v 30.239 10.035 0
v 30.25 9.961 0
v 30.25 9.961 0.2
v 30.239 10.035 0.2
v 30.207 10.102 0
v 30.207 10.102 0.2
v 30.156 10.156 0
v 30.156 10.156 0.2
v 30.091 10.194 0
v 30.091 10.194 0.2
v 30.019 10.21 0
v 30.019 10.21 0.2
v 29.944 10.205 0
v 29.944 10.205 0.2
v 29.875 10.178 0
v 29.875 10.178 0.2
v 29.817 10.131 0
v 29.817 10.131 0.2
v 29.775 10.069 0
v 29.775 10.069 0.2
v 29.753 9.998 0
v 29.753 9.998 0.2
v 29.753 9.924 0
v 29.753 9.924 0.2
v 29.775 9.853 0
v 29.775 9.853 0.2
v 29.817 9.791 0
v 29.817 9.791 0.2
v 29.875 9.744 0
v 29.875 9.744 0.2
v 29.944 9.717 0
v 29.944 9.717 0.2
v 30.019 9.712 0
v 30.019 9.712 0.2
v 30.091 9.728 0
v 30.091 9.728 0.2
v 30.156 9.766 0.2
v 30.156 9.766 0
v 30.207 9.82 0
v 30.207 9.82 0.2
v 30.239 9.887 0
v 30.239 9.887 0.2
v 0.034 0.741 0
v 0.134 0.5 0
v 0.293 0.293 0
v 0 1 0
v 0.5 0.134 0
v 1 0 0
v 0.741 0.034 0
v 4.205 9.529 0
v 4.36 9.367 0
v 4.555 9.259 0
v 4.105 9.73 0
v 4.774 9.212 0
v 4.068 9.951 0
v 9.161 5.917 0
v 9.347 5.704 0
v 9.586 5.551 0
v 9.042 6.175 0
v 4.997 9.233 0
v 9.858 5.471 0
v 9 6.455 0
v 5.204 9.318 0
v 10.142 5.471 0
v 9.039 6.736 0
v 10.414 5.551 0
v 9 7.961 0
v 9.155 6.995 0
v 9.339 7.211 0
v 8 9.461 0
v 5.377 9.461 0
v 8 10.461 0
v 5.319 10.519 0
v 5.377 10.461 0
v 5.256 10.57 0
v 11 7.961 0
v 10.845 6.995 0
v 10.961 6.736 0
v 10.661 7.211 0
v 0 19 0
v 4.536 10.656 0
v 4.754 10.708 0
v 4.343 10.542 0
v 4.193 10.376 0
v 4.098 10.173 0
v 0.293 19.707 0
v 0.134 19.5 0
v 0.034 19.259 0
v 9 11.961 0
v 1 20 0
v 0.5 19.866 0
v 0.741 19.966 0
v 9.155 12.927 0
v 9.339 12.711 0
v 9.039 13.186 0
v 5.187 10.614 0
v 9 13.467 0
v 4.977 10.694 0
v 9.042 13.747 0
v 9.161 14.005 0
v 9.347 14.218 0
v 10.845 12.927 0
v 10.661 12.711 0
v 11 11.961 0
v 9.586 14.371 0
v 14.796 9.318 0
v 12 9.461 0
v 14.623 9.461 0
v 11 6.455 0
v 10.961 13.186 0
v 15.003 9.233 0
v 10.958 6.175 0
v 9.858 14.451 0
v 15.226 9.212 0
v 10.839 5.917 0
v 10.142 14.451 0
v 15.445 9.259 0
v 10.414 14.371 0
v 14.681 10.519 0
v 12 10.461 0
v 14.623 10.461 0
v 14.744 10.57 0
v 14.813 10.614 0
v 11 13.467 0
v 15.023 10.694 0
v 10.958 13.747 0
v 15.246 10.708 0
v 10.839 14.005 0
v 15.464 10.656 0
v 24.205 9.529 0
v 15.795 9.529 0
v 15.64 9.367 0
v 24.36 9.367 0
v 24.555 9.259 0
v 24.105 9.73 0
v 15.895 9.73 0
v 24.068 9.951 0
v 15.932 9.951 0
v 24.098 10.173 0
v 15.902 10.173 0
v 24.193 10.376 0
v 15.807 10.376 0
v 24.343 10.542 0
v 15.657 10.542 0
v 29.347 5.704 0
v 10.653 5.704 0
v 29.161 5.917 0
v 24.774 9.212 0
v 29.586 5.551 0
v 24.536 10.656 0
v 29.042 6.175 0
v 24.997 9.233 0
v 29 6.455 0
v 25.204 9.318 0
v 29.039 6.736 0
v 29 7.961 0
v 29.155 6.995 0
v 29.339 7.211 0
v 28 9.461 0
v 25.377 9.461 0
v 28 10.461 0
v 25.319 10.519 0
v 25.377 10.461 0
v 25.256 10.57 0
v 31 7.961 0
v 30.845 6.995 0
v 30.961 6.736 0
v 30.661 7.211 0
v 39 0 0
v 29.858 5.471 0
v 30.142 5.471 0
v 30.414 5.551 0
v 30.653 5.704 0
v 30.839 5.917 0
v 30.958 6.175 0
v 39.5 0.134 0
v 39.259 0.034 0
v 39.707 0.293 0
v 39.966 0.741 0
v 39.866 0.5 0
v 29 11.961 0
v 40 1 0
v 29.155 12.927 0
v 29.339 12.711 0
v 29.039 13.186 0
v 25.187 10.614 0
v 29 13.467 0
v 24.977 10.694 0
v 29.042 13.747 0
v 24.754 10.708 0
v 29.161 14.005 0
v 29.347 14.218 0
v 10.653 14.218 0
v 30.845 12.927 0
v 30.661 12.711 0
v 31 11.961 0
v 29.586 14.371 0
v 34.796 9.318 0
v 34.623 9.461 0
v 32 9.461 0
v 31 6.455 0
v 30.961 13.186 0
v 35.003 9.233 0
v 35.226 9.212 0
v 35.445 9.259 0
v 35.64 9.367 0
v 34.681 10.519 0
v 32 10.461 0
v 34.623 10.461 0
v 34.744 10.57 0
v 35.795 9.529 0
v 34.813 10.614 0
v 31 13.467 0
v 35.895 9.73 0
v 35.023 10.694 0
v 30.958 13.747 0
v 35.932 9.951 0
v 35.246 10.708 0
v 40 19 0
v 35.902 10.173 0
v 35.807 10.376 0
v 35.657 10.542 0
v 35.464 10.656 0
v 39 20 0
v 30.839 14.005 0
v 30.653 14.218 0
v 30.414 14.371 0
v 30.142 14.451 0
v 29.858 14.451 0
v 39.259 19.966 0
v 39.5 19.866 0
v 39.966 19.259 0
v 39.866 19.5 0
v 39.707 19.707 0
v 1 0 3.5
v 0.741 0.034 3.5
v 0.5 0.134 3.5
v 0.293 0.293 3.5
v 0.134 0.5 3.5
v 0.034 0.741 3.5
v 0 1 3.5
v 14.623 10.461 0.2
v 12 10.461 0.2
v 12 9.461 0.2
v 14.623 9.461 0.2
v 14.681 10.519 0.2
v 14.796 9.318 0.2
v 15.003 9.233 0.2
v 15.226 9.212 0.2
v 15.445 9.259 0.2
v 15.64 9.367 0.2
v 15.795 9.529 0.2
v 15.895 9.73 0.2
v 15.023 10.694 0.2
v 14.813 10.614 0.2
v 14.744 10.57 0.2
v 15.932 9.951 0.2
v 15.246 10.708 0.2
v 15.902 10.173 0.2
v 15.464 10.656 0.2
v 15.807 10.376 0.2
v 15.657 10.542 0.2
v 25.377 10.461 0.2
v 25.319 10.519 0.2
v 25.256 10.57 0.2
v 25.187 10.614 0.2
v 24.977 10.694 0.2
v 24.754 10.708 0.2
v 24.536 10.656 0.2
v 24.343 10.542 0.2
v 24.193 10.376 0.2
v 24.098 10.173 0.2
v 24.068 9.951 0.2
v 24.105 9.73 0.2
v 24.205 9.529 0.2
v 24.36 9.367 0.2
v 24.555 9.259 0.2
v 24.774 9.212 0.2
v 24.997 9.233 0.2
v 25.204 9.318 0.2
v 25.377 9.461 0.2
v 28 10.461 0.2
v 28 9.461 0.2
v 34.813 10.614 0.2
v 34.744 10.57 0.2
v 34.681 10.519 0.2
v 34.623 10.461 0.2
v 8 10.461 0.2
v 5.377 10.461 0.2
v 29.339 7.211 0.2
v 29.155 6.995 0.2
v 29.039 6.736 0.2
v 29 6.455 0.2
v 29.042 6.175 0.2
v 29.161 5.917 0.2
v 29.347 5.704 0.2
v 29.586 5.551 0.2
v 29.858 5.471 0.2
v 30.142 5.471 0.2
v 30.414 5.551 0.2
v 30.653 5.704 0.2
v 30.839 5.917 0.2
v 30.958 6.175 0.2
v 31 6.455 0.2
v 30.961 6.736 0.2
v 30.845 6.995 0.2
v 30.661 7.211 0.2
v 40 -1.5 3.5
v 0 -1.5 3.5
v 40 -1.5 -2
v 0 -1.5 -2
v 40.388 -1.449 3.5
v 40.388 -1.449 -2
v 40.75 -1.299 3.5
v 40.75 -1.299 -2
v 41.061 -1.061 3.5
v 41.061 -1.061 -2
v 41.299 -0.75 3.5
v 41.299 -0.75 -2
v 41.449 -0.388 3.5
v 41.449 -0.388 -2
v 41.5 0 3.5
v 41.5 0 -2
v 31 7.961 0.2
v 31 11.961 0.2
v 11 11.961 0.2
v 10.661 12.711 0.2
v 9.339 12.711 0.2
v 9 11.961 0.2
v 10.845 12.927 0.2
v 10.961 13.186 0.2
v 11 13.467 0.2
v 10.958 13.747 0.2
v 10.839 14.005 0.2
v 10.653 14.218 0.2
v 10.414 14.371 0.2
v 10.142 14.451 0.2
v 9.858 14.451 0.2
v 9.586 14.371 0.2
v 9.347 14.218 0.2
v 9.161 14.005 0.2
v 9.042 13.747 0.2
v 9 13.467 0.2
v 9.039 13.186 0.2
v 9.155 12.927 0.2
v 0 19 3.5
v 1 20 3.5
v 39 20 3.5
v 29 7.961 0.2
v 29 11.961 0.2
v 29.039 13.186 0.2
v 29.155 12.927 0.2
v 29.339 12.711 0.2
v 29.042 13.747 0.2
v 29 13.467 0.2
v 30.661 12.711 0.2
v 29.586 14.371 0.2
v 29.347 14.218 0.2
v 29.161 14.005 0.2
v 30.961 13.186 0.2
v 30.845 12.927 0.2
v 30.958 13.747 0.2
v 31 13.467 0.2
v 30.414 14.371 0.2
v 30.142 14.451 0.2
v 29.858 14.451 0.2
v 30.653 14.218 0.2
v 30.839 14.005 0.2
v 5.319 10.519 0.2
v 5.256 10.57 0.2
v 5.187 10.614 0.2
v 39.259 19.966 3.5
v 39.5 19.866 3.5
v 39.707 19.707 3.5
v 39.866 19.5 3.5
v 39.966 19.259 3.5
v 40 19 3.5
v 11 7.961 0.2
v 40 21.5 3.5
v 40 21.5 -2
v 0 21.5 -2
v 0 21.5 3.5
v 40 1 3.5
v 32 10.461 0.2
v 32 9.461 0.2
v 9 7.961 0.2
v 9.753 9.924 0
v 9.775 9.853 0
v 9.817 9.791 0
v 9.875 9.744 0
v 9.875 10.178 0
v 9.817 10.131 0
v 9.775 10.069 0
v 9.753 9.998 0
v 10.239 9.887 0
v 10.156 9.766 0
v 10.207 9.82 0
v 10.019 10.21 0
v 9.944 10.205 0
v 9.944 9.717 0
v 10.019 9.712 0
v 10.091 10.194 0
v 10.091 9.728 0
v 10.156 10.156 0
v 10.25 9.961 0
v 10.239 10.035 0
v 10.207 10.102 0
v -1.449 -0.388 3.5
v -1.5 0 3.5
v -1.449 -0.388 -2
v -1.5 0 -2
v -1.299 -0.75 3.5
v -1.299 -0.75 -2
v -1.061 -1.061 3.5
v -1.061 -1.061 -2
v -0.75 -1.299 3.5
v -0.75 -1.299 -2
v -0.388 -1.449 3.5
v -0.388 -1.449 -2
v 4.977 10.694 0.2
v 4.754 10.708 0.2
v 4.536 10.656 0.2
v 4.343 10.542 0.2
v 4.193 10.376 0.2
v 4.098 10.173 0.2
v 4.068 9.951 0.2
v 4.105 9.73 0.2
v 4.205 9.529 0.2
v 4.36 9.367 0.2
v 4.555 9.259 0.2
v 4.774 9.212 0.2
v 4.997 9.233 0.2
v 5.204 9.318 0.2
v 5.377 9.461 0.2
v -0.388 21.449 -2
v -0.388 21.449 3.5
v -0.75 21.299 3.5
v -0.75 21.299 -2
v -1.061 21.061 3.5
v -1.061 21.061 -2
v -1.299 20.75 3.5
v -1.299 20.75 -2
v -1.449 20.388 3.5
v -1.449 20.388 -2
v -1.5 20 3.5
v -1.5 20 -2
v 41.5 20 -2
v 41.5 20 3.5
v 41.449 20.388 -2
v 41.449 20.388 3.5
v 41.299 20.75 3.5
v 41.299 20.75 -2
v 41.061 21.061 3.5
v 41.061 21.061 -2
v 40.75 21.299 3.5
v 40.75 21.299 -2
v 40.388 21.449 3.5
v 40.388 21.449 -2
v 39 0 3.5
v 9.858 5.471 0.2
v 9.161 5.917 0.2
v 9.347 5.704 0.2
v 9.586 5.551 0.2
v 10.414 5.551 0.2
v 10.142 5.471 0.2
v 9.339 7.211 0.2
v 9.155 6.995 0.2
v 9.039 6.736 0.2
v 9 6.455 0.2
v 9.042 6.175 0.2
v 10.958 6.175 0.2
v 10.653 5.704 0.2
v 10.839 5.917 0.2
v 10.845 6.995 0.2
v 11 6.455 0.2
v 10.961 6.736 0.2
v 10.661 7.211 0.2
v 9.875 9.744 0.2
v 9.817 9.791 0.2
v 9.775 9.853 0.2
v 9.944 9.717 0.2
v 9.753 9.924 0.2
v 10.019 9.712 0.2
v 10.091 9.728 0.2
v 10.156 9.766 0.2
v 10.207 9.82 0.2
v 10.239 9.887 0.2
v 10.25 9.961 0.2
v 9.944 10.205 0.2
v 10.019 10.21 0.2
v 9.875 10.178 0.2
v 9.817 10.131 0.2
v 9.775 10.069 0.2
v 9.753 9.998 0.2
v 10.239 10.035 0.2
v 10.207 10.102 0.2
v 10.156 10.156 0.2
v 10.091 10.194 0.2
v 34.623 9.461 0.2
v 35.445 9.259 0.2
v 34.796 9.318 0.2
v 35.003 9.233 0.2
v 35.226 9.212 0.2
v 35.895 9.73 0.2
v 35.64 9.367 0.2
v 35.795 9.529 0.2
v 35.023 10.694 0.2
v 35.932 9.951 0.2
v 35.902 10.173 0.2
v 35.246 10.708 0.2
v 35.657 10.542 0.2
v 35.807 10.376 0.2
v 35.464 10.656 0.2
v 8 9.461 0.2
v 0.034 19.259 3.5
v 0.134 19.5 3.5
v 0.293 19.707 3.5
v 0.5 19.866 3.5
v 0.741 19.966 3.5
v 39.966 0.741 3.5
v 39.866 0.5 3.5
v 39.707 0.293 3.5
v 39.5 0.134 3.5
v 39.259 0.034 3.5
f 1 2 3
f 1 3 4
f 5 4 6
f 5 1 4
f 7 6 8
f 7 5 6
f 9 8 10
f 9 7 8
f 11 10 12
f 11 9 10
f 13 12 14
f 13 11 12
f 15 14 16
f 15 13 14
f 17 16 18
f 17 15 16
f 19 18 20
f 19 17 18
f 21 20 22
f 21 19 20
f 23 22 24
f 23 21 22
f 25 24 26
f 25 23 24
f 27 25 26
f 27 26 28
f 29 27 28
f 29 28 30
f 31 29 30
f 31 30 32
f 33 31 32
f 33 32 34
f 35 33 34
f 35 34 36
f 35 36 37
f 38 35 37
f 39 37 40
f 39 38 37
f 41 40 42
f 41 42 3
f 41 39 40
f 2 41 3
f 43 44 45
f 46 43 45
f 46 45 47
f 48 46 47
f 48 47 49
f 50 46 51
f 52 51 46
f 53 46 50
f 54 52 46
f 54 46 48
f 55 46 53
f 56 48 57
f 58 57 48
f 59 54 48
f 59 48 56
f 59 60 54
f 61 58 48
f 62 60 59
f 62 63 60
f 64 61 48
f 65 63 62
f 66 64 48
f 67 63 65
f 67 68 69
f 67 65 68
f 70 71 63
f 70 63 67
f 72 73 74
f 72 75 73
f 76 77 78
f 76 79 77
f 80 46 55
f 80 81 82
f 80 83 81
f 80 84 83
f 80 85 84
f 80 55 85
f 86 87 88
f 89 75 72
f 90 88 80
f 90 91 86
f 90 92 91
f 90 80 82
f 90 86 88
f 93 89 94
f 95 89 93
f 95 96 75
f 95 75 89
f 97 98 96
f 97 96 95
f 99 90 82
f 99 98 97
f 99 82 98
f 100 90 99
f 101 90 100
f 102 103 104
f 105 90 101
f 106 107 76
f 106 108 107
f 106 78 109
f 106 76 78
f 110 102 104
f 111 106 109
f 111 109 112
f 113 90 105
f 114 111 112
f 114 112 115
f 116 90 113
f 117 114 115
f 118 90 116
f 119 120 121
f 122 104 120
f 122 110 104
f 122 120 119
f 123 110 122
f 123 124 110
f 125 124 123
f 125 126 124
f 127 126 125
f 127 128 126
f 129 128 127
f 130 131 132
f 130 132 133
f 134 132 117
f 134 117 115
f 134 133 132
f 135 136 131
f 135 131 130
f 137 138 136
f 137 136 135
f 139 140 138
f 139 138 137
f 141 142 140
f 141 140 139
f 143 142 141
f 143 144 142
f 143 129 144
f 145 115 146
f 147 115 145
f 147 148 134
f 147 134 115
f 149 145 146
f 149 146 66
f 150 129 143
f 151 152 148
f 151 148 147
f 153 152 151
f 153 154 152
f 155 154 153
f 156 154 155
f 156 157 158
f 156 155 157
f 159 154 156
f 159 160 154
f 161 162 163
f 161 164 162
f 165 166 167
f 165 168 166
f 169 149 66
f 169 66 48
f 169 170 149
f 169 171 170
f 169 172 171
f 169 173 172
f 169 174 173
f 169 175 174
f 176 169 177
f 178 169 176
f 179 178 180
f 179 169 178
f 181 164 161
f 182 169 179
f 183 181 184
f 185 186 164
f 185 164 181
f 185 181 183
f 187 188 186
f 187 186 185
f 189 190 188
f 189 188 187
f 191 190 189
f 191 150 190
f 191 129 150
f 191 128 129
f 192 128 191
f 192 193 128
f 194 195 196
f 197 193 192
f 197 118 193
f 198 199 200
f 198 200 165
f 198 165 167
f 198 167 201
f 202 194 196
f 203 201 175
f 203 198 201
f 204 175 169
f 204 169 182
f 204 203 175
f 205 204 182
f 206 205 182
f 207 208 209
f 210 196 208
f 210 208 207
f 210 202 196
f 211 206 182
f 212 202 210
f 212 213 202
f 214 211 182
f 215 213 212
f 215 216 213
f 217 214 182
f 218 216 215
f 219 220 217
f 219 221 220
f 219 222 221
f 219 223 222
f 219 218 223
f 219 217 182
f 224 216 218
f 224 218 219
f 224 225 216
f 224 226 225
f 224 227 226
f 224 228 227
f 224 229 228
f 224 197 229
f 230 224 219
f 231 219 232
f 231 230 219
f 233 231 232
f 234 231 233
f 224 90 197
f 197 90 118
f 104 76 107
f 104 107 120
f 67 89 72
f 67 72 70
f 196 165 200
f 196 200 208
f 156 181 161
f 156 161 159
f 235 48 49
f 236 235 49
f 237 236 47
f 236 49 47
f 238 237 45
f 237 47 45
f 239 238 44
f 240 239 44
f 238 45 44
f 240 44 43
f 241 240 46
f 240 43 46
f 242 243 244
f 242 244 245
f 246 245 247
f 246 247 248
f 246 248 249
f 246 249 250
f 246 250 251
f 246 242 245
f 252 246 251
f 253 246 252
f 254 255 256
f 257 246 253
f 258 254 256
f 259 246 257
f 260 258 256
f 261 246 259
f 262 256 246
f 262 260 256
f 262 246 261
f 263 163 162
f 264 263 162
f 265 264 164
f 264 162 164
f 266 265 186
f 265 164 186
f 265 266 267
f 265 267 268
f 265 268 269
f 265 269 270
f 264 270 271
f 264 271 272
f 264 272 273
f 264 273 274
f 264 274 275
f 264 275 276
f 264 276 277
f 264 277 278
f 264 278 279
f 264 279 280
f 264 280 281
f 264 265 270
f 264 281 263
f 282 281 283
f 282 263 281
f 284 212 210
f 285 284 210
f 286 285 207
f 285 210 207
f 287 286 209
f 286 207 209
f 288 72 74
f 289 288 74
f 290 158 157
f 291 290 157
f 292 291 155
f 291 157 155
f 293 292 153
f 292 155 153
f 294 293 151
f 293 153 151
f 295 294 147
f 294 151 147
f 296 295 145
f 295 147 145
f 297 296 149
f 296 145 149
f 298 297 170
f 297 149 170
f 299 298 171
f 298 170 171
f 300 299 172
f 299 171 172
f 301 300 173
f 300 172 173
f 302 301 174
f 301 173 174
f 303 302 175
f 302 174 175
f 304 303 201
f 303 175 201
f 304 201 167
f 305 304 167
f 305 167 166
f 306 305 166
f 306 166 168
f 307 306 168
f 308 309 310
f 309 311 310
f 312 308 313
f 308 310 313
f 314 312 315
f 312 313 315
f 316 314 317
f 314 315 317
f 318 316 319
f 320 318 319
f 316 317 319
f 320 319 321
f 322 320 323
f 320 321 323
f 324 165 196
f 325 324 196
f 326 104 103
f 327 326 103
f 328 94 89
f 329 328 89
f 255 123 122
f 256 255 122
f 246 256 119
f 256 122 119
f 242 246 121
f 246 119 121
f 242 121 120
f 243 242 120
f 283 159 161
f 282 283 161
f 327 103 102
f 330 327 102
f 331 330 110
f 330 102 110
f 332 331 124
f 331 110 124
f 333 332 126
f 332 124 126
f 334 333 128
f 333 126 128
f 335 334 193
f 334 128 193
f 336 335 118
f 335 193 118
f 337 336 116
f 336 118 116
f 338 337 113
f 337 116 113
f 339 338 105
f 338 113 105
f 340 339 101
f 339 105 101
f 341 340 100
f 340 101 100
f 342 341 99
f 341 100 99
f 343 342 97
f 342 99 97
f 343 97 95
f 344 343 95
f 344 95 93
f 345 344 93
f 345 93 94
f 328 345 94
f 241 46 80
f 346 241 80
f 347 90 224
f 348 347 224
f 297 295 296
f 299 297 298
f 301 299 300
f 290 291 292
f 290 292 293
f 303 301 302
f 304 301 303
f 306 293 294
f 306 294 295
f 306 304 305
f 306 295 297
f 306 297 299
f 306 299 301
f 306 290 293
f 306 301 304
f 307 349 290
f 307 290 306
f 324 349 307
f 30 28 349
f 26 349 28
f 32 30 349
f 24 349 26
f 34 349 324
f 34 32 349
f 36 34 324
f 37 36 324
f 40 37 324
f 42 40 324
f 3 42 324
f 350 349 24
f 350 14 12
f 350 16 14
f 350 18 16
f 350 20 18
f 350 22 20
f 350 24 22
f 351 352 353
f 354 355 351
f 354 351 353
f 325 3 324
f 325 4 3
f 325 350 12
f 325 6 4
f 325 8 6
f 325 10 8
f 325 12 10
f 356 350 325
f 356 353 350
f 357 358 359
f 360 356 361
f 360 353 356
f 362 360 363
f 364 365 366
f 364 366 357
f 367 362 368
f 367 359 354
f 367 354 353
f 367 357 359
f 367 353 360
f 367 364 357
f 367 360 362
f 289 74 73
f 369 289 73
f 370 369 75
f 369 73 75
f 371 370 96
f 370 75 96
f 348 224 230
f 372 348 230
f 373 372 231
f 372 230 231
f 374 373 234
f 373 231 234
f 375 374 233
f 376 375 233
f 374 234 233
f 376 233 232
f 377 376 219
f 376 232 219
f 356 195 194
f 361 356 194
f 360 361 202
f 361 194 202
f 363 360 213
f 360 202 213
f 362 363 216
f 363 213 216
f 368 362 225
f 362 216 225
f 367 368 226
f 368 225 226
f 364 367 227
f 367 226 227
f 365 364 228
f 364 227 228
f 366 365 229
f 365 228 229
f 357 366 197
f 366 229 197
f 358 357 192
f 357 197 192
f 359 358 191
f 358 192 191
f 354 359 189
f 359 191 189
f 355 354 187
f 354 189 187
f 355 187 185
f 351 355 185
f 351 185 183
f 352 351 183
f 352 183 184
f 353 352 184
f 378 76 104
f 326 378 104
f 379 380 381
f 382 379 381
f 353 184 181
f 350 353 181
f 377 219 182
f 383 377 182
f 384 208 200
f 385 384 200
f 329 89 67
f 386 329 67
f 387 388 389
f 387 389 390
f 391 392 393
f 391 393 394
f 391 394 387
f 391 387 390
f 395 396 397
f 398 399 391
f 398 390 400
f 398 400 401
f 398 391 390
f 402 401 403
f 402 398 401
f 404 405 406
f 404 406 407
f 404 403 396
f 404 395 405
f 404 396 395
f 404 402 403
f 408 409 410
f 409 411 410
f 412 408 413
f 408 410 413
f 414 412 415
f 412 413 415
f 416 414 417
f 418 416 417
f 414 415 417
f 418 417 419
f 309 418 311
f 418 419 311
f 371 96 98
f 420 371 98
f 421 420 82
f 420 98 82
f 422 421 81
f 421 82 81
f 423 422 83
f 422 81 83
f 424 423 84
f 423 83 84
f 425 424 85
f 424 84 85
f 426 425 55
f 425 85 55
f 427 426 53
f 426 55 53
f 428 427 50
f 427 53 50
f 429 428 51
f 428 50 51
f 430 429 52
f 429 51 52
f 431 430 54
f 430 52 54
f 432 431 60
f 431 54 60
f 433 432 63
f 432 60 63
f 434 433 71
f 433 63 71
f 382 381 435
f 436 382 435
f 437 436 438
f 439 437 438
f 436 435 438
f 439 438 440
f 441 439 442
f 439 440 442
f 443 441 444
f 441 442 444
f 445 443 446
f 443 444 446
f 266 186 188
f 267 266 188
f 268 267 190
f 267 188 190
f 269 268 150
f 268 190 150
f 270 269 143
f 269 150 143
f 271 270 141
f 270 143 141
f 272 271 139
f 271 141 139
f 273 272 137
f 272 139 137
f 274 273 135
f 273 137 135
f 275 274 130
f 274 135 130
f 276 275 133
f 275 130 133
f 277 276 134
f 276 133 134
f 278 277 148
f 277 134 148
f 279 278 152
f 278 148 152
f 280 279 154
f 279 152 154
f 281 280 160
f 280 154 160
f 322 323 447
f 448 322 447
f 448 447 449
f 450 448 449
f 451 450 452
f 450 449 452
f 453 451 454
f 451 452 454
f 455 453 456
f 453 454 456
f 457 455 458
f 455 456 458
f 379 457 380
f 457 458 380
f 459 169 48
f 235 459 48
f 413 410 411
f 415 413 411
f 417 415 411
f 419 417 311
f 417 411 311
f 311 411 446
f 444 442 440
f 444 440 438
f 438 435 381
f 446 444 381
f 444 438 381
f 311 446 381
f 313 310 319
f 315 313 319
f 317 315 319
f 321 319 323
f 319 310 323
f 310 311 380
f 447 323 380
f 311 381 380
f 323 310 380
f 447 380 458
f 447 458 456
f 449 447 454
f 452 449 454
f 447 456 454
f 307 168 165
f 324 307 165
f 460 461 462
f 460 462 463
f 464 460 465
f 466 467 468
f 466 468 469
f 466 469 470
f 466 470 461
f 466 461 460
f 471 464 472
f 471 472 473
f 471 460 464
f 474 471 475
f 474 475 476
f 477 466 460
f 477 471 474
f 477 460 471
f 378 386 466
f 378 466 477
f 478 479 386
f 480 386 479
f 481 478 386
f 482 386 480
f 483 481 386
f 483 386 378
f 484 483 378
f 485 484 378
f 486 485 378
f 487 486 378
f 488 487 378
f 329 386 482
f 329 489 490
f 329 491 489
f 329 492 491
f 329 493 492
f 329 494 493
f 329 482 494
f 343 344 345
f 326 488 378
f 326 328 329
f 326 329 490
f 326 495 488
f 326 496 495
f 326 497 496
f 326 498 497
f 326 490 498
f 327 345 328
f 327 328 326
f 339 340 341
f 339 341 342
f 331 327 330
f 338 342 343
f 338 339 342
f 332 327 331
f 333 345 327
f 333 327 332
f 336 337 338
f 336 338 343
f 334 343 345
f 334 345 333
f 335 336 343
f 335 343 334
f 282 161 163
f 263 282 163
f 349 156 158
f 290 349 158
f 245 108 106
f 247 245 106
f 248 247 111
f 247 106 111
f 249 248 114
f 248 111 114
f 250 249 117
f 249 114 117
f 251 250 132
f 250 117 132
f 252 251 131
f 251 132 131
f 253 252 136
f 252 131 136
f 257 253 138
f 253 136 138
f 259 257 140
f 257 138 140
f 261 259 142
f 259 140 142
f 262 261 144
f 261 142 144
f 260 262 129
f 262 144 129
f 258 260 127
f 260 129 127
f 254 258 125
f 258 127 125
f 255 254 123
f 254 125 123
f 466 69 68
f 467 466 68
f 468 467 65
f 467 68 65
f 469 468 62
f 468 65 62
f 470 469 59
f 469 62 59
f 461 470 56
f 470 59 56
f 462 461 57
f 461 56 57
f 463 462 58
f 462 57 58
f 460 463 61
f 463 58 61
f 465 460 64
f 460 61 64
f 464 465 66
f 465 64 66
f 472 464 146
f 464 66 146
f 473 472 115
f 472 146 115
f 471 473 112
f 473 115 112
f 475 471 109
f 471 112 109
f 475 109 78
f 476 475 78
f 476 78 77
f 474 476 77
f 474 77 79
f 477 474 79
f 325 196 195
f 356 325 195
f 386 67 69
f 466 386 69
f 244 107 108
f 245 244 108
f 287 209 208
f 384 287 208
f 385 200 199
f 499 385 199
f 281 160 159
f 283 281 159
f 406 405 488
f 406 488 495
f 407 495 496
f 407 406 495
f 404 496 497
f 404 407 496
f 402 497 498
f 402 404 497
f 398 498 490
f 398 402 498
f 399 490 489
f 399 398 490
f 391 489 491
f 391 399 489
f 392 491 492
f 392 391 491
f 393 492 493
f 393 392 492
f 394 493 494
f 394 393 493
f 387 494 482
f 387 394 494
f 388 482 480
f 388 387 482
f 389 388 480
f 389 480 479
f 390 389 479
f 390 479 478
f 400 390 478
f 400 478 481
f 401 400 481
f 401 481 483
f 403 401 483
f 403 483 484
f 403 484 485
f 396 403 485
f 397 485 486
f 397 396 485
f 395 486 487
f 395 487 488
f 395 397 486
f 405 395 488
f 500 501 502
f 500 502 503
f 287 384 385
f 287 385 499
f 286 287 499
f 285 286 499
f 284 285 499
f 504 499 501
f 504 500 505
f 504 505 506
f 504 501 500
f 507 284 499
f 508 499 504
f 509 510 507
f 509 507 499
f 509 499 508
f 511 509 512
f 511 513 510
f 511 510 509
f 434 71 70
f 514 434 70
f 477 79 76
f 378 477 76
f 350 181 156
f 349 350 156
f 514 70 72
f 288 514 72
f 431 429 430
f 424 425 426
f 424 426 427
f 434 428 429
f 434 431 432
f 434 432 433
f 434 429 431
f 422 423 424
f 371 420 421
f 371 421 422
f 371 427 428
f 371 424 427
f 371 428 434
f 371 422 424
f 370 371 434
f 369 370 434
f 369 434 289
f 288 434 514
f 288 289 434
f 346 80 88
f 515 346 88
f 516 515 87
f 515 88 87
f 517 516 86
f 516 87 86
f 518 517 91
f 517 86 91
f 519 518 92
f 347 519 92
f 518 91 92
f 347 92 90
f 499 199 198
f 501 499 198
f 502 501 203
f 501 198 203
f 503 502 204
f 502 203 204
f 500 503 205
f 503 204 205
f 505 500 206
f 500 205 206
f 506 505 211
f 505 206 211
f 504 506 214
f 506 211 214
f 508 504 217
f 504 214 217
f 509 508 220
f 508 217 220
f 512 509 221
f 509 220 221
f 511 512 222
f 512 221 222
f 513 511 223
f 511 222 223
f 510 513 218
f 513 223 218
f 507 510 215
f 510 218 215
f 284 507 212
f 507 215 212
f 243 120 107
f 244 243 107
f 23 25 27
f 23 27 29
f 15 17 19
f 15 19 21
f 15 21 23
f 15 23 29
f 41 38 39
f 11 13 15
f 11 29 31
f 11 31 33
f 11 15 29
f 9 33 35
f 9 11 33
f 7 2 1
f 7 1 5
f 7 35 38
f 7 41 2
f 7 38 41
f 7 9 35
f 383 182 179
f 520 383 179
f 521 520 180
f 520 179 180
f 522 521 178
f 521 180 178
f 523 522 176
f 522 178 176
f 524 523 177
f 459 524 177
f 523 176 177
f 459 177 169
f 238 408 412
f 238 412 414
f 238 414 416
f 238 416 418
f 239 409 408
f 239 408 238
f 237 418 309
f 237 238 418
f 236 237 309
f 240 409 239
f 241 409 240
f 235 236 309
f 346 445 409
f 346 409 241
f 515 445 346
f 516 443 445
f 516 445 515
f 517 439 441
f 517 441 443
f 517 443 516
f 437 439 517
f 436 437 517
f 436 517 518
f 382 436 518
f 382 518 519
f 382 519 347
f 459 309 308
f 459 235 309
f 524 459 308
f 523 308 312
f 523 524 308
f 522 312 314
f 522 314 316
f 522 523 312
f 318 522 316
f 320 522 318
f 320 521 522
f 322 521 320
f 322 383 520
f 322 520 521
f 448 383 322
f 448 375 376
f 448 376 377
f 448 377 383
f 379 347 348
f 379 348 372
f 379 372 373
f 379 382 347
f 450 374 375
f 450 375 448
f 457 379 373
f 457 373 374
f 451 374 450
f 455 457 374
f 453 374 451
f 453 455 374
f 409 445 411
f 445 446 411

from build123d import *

# Parameters (mm, degrees)
F0_R     = 0.25
F1_DEPTH = 2
F2_DEPTH = 3.5
F3_DEPTH = 0.2


with BuildPart() as f1:
    # F0 (on Top) → F1 (new body)
    with BuildSketch(Plane.XY):
        with BuildLine():
            ThreePointArc((0, 21.5), (-1.06066, 21.06066), (-1.5, 20))
            Line((-1.5, 20), (-1.5, 0))
            ThreePointArc((-1.5, 0), (-1.06066, -1.06066), (0, -1.5))
            Line((0, -1.5), (40, -1.5))
            ThreePointArc((40, -1.5), (41.06066, -1.06066), (41.5, 0))
            Line((41.5, 0), (41.5, 20))
            ThreePointArc((41.5, 20), (41.06066, 21.06066), (40, 21.5))
            Line((40, 21.5), (0, 21.5))
        make_face()
        with BuildLine():
            Line((19.75, 0), (1, 0))
            ThreePointArc((1, 0), (0.292893, 0.292893), (0, 1))
            Line((0, 1), (0, 19))
            ThreePointArc((0, 19), (0.292893, 19.707107), (1, 20))
            Line((1, 20), (19.75, 20))
            Line((19.75, 20), (20.25, 20))
            Line((20.25, 20), (39, 20))
            ThreePointArc((39, 20), (39.707107, 19.707107), (40, 19))
            Line((40, 19), (40, 1))
            ThreePointArc((40, 1), (39.707107, 0.292893), (39, 0))
            Line((39, 0), (20.25, 0))
            Line((20.25, 0), (19.75, 0))
        make_face(mode=Mode.SUBTRACT)
        with BuildLine():
            ThreePointArc((0, 1), (0.292893, 0.292893), (1, 0))
            Line((1, 0), (19.75, 0))
            Line((19.75, 0), (19.75, 10))
            Line((19.75, 10), (19.75, 20))
            Line((19.75, 20), (1, 20))
            ThreePointArc((1, 20), (0.292893, 19.707107), (0, 19))
            Line((0, 19), (0, 1))
        make_face()
        with BuildLine():
            Line((10.661438, 12.711), (11, 11.961))
            Line((11, 11.961), (11.338563, 12.711))
            Line((11.338563, 12.711), (11.99852, 13.37373))
            Line((11.99852, 13.37373), (14.216055, 15.591268))
            ThreePointArc((14.216055, 15.591268), (15.889087, 16.557194), (14.923162, 14.884161))
            Line((14.923162, 14.884161), (12, 11.961))
            Line((12, 11.961), (12, 10.461))
            Line((12, 10.461), (14.622964, 10.461))
            ThreePointArc((14.622964, 10.461), (14.711865, 10.545372), (14.81332, 10.614138))
            ThreePointArc((14.81332, 10.614138), (15.921966, 9.838845), (14.622964, 9.461))
            Line((14.622964, 9.461), (12, 9.461))
            Line((12, 9.461), (12, 7.961))
            Line((12, 7.961), (14.923162, 5.037839))
            ThreePointArc((14.923162, 5.037839), (15.889087, 3.364806), (14.216055, 4.330732))
            Line((14.216055, 4.330732), (11.99852, 6.54827))
            Line((11.99852, 6.54827), (11.338563, 7.211))
            Line((11.338563, 7.211), (11, 7.961))
            Line((11, 7.961), (10.661438, 7.211))
            ThreePointArc((10.661438, 7.211), (10, 5.461), (9.338563, 7.211))
            Line((9.338563, 7.211), (9, 7.961))
            Line((9, 7.961), (8.661438, 7.211))
            Line((8.661438, 7.211), (8.001481, 6.54827))
            Line((8.001481, 6.54827), (5.783946, 4.330732))
            ThreePointArc((5.783946, 4.330732), (4.110914, 3.364806), (5.076839, 5.037839))
            Line((5.076839, 5.037839), (8, 7.961))
            Line((8, 7.961), (8, 9.461))
            Line((8, 9.461), (5.377037, 9.461))
            ThreePointArc((5.377037, 9.461), (4.078035, 9.838845), (5.18668, 10.614138))
            ThreePointArc((5.18668, 10.614138), (5.288136, 10.545372), (5.377037, 10.461))
            Line((5.377037, 10.461), (8, 10.461))
            Line((8, 10.461), (8, 11.961))
            Line((8, 11.961), (5.076839, 14.884161))
            ThreePointArc((5.076839, 14.884161), (4.110914, 16.557194), (5.783946, 15.591268))
            Line((5.783946, 15.591268), (8.001481, 13.37373))
            Line((8.001481, 13.37373), (8.661438, 12.711))
            Line((8.661438, 12.711), (9, 11.961))
            Line((9, 11.961), (9.338563, 12.711))
            ThreePointArc((9.338563, 12.711), (10, 14.461), (10.661438, 12.711))
        make_face(mode=Mode.SUBTRACT)
        with BuildLine():
            Line((11, 7.961), (11, 9.961))
            Line((11, 9.961), (11, 11.961))
            Line((11, 11.961), (10.661438, 12.711))
            ThreePointArc((10.661438, 12.711), (10, 14.461), (9.338563, 12.711))
            Line((9.338563, 12.711), (9, 11.961))
            Line((9, 11.961), (9, 9.961))
            Line((9, 9.961), (9, 7.961))
            Line((9, 7.961), (9.338563, 7.211))
            ThreePointArc((9.338563, 7.211), (10, 5.461), (10.661438, 7.211))
            Line((10.661438, 7.211), (11, 7.961))
        make_face()
        with Locations((10, 9.961)):
            Circle(F0_R, mode=Mode.SUBTRACT)
        with BuildLine():
            Line((9, 9.961), (9, 11.961))
            Line((9, 11.961), (8.661438, 12.711))
            Line((8.661438, 12.711), (8.001481, 13.37373))
            Line((8.001481, 13.37373), (5.783946, 15.591268))
            ThreePointArc((5.783946, 15.591268), (4.110914, 16.557194), (5.076839, 14.884161))
            Line((5.076839, 14.884161), (8, 11.961))
            Line((8, 11.961), (8, 10.461))
            Line((8, 10.461), (8, 9.961))
            Line((8, 9.961), (8, 9.461))
            Line((8, 9.461), (8, 7.961))
            Line((8, 7.961), (5.076839, 5.037839))
            ThreePointArc((5.076839, 5.037839), (4.110914, 3.364806), (5.783946, 4.330732))
            Line((5.783946, 4.330732), (8.001481, 6.54827))
            Line((8.001481, 6.54827), (8.661438, 7.211))
            Line((8.661438, 7.211), (9, 7.961))
            Line((9, 7.961), (9, 9.961))
        make_face()
        with BuildLine():
            Line((8, 9.961), (8, 10.461))
            Line((8, 10.461), (5.377037, 10.461))
            ThreePointArc((5.377037, 10.461), (5.288136, 10.545372), (5.18668, 10.614138))
            ThreePointArc((5.18668, 10.614138), (4.078035, 9.838845), (5.377037, 9.461))
            Line((5.377037, 9.461), (8, 9.461))
            Line((8, 9.461), (8, 9.961))
        make_face()
        with BuildLine():
            Line((11, 11.961), (11, 9.961))
            Line((11, 9.961), (11, 7.961))
            Line((11, 7.961), (11.338563, 7.211))
            Line((11.338563, 7.211), (11.99852, 6.54827))
            Line((11.99852, 6.54827), (14.216055, 4.330732))
            ThreePointArc((14.216055, 4.330732), (15.889087, 3.364806), (14.923162, 5.037839))
            Line((14.923162, 5.037839), (12, 7.961))
            Line((12, 7.961), (12, 9.461))
            Line((12, 9.461), (12, 9.961))
            Line((12, 9.961), (12, 10.461))
            Line((12, 10.461), (12, 11.961))
            Line((12, 11.961), (14.923162, 14.884161))
            ThreePointArc((14.923162, 14.884161), (15.889087, 16.557194), (14.216055, 15.591268))
            Line((14.216055, 15.591268), (11.99852, 13.37373))
            Line((11.99852, 13.37373), (11.338563, 12.711))
            Line((11.338563, 12.711), (11, 11.961))
        make_face()
        with BuildLine():
            Line((14.622964, 10.461), (12, 10.461))
            Line((12, 10.461), (12, 9.961))
            Line((12, 9.961), (12, 9.461))
            Line((12, 9.461), (14.622964, 9.461))
            ThreePointArc((14.622964, 9.461), (15.921966, 9.838845), (14.81332, 10.614138))
            ThreePointArc((14.81332, 10.614138), (14.711865, 10.545372), (14.622964, 10.461))
        make_face()
        Polygon((19.75, 10), (19.75, 0), (20.25, 0), (20.25, 20), (19.75, 20), align=None)
        with BuildLine():
            Line((20.25, 20), (20.25, 0))
            Line((20.25, 0), (39, 0))
            ThreePointArc((39, 0), (39.707107, 0.292893), (40, 1))
            Line((40, 1), (40, 19))
            ThreePointArc((40, 19), (39.707107, 19.707107), (39, 20))
            Line((39, 20), (20.25, 20))
        make_face()
        with BuildLine():
            Line((31, 11.961), (31.338562, 12.711))
            Line((31.338562, 12.711), (31.998519, 13.37373))
            Line((31.998519, 13.37373), (34.216054, 15.591268))
            ThreePointArc((34.216054, 15.591268), (35.889086, 16.557194), (34.923161, 14.884161))
            Line((34.923161, 14.884161), (32, 11.961))
            Line((32, 11.961), (32, 10.461))
            Line((32, 10.461), (34.622963, 10.461))
            ThreePointArc((34.622963, 10.461), (34.711864, 10.545372), (34.81332, 10.614138))
            ThreePointArc((34.81332, 10.614138), (35.921965, 9.838845), (34.622963, 9.461))
            Line((34.622963, 9.461), (32, 9.461))
            Line((32, 9.461), (32, 7.961))
            Line((32, 7.961), (34.923161, 5.037839))
            ThreePointArc((34.923161, 5.037839), (35.889086, 3.364806), (34.216054, 4.330732))
            Line((34.216054, 4.330732), (31.998519, 6.54827))
            Line((31.998519, 6.54827), (31.338562, 7.211))
            Line((31.338562, 7.211), (31, 7.961))
            Line((31, 7.961), (30.661437, 7.211))
            ThreePointArc((30.661437, 7.211), (30, 5.461), (29.338562, 7.211))
            Line((29.338562, 7.211), (29, 7.961))
            Line((29, 7.961), (28.661437, 7.211))
            Line((28.661437, 7.211), (28.00148, 6.54827))
            Line((28.00148, 6.54827), (25.783945, 4.330732))
            ThreePointArc((25.783945, 4.330732), (24.110913, 3.364806), (25.076838, 5.037839))
            Line((25.076838, 5.037839), (28, 7.961))
            Line((28, 7.961), (28, 9.461))
            Line((28, 9.461), (25.377036, 9.461))
            ThreePointArc((25.377036, 9.461), (24.078034, 9.838845), (25.18668, 10.614138))
            ThreePointArc((25.18668, 10.614138), (25.288135, 10.545372), (25.377036, 10.461))
            Line((25.377036, 10.461), (28, 10.461))
            Line((28, 10.461), (28, 11.961))
            Line((28, 11.961), (25.076838, 14.884161))
            ThreePointArc((25.076838, 14.884161), (24.110913, 16.557194), (25.783945, 15.591268))
            Line((25.783945, 15.591268), (28.00148, 13.37373))
            Line((28.00148, 13.37373), (28.661437, 12.711))
            Line((28.661437, 12.711), (29, 11.961))
            Line((29, 11.961), (29.338562, 12.711))
            ThreePointArc((29.338562, 12.711), (30, 14.461), (30.661437, 12.711))
            Line((30.661437, 12.711), (31, 11.961))
        make_face(mode=Mode.SUBTRACT)
        with BuildLine():
            Line((34.622963, 10.461), (32, 10.461))
            Line((32, 10.461), (32, 9.961))
            Line((32, 9.961), (32, 9.461))
            Line((32, 9.461), (34.622963, 9.461))
            ThreePointArc((34.622963, 9.461), (35.921965, 9.838845), (34.81332, 10.614138))
            ThreePointArc((34.81332, 10.614138), (34.711864, 10.545372), (34.622963, 10.461))
        make_face()
        with BuildLine():
            Line((31.998519, 13.37373), (31.338562, 12.711))
            Line((31.338562, 12.711), (31, 11.961))
            Line((31, 11.961), (31, 9.961))
            Line((31, 9.961), (31, 7.961))
            Line((31, 7.961), (31.338562, 7.211))
            Line((31.338562, 7.211), (31.998519, 6.54827))
            Line((31.998519, 6.54827), (34.216054, 4.330732))
            ThreePointArc((34.216054, 4.330732), (35.889086, 3.364806), (34.923161, 5.037839))
            Line((34.923161, 5.037839), (32, 7.961))
            Line((32, 7.961), (32, 9.461))
            Line((32, 9.461), (32, 9.961))
            Line((32, 9.961), (32, 10.461))
            Line((32, 10.461), (32, 11.961))
            Line((32, 11.961), (34.923161, 14.884161))
            ThreePointArc((34.923161, 14.884161), (35.889086, 16.557194), (34.216054, 15.591268))
            Line((34.216054, 15.591268), (31.998519, 13.37373))
        make_face()
        with BuildLine():
            Line((31, 9.961), (31, 11.961))
            Line((31, 11.961), (30.661437, 12.711))
            ThreePointArc((30.661437, 12.711), (30, 14.461), (29.338562, 12.711))
            Line((29.338562, 12.711), (29, 11.961))
            Line((29, 11.961), (29, 9.961))
            Line((29, 9.961), (29, 7.961))
            Line((29, 7.961), (29.338562, 7.211))
            ThreePointArc((29.338562, 7.211), (30, 5.461), (30.661437, 7.211))
            Line((30.661437, 7.211), (31, 7.961))
            Line((31, 7.961), (31, 9.961))
        make_face()
        with Locations((30, 9.961)):
            Circle(F0_R, mode=Mode.SUBTRACT)
        with BuildLine():
            Line((29, 9.961), (29, 11.961))
            Line((29, 11.961), (28.661437, 12.711))
            Line((28.661437, 12.711), (28.00148, 13.37373))
            Line((28.00148, 13.37373), (25.783945, 15.591268))
            ThreePointArc((25.783945, 15.591268), (24.110913, 16.557194), (25.076838, 14.884161))
            Line((25.076838, 14.884161), (28, 11.961))
            Line((28, 11.961), (28, 10.461))
            Line((28, 10.461), (28, 9.961))
            Line((28, 9.961), (28, 9.461))
            Line((28, 9.461), (28, 7.961))
            Line((28, 7.961), (25.076838, 5.037839))
            ThreePointArc((25.076838, 5.037839), (24.110913, 3.364806), (25.783945, 4.330732))
            Line((25.783945, 4.330732), (28.00148, 6.54827))
            Line((28.00148, 6.54827), (28.661437, 7.211))
            Line((28.661437, 7.211), (29, 7.961))
            Line((29, 7.961), (29, 9.961))
        make_face()
        with BuildLine():
            Line((28, 9.961), (28, 10.461))
            Line((28, 10.461), (25.377036, 10.461))
            ThreePointArc((25.377036, 10.461), (25.288135, 10.545372), (25.18668, 10.614138))
            ThreePointArc((25.18668, 10.614138), (24.078034, 9.838845), (25.377036, 9.461))
            Line((25.377036, 9.461), (28, 9.461))
            Line((28, 9.461), (28, 9.961))
        make_face()
        with Locations((30, 9.961)):
            Circle(F0_R)
        with Locations((10, 9.961)):
            Circle(F0_R)
    extrude(amount=-F1_DEPTH)

    # F0 (on Top) → F2 (join)
    with BuildSketch(Plane.XY):
        with BuildLine():
            ThreePointArc((0, 21.5), (-1.06066, 21.06066), (-1.5, 20))
            Line((-1.5, 20), (-1.5, 0))
            ThreePointArc((-1.5, 0), (-1.06066, -1.06066), (0, -1.5))
            Line((0, -1.5), (40, -1.5))
            ThreePointArc((40, -1.5), (41.06066, -1.06066), (41.5, 0))
            Line((41.5, 0), (41.5, 20))
            ThreePointArc((41.5, 20), (41.06066, 21.06066), (40, 21.5))
            Line((40, 21.5), (0, 21.5))
        make_face()
        with BuildLine():
            Line((19.75, 0), (1, 0))
            ThreePointArc((1, 0), (0.292893, 0.292893), (0, 1))
            Line((0, 1), (0, 19))
            ThreePointArc((0, 19), (0.292893, 19.707107), (1, 20))
            Line((1, 20), (19.75, 20))
            Line((19.75, 20), (20.25, 20))
            Line((20.25, 20), (39, 20))
            ThreePointArc((39, 20), (39.707107, 19.707107), (40, 19))
            Line((40, 19), (40, 1))
            ThreePointArc((40, 1), (39.707107, 0.292893), (39, 0))
            Line((39, 0), (20.25, 0))
            Line((20.25, 0), (19.75, 0))
        make_face(mode=Mode.SUBTRACT)
    extrude(amount=F2_DEPTH)

    # F0 (on Top) → F3 (join)
    with BuildSketch(Plane.XY):
        with BuildLine():
            Line((11, 7.961), (11, 9.961))
            Line((11, 9.961), (11, 11.961))
            Line((11, 11.961), (10.661438, 12.711))
            ThreePointArc((10.661438, 12.711), (10, 14.461), (9.338563, 12.711))
            Line((9.338563, 12.711), (9, 11.961))
            Line((9, 11.961), (9, 9.961))
            Line((9, 9.961), (9, 7.961))
            Line((9, 7.961), (9.338563, 7.211))
            ThreePointArc((9.338563, 7.211), (10, 5.461), (10.661438, 7.211))
            Line((10.661438, 7.211), (11, 7.961))
        make_face()
        with Locations((10, 9.961)):
            Circle(F0_R, mode=Mode.SUBTRACT)
        with BuildLine():
            Line((8, 9.961), (8, 10.461))
            Line((8, 10.461), (5.377037, 10.461))
            ThreePointArc((5.377037, 10.461), (5.288136, 10.545372), (5.18668, 10.614138))
            ThreePointArc((5.18668, 10.614138), (4.078035, 9.838845), (5.377037, 9.461))
            Line((5.377037, 9.461), (8, 9.461))
            Line((8, 9.461), (8, 9.961))
        make_face()
        with BuildLine():
            Line((14.622964, 10.461), (12, 10.461))
            Line((12, 10.461), (12, 9.961))
            Line((12, 9.961), (12, 9.461))
            Line((12, 9.461), (14.622964, 9.461))
            ThreePointArc((14.622964, 9.461), (15.921966, 9.838845), (14.81332, 10.614138))
            ThreePointArc((14.81332, 10.614138), (14.711865, 10.545372), (14.622964, 10.461))
        make_face()
        with BuildLine():
            Line((28, 9.961), (28, 10.461))
            Line((28, 10.461), (25.377036, 10.461))
            ThreePointArc((25.377036, 10.461), (25.288135, 10.545372), (25.18668, 10.614138))
            ThreePointArc((25.18668, 10.614138), (24.078034, 9.838845), (25.377036, 9.461))
            Line((25.377036, 9.461), (28, 9.461))
            Line((28, 9.461), (28, 9.961))
        make_face()
        with BuildLine():
            Line((31, 9.961), (31, 11.961))
            Line((31, 11.961), (30.661437, 12.711))
            ThreePointArc((30.661437, 12.711), (30, 14.461), (29.338562, 12.711))
            Line((29.338562, 12.711), (29, 11.961))
            Line((29, 11.961), (29, 9.961))
            Line((29, 9.961), (29, 7.961))
            Line((29, 7.961), (29.338562, 7.211))
            ThreePointArc((29.338562, 7.211), (30, 5.461), (30.661437, 7.211))
            Line((30.661437, 7.211), (31, 7.961))
            Line((31, 7.961), (31, 9.961))
        make_face()
        with Locations((30, 9.961)):
            Circle(F0_R, mode=Mode.SUBTRACT)
        with BuildLine():
            Line((34.622963, 10.461), (32, 10.461))
            Line((32, 10.461), (32, 9.961))
            Line((32, 9.961), (32, 9.461))
            Line((32, 9.461), (34.622963, 9.461))
            ThreePointArc((34.622963, 9.461), (35.921965, 9.838845), (34.81332, 10.614138))
            ThreePointArc((34.81332, 10.614138), (34.711864, 10.545372), (34.622963, 10.461))
        make_face()
    extrude(amount=F3_DEPTH)


solid = f1.part
